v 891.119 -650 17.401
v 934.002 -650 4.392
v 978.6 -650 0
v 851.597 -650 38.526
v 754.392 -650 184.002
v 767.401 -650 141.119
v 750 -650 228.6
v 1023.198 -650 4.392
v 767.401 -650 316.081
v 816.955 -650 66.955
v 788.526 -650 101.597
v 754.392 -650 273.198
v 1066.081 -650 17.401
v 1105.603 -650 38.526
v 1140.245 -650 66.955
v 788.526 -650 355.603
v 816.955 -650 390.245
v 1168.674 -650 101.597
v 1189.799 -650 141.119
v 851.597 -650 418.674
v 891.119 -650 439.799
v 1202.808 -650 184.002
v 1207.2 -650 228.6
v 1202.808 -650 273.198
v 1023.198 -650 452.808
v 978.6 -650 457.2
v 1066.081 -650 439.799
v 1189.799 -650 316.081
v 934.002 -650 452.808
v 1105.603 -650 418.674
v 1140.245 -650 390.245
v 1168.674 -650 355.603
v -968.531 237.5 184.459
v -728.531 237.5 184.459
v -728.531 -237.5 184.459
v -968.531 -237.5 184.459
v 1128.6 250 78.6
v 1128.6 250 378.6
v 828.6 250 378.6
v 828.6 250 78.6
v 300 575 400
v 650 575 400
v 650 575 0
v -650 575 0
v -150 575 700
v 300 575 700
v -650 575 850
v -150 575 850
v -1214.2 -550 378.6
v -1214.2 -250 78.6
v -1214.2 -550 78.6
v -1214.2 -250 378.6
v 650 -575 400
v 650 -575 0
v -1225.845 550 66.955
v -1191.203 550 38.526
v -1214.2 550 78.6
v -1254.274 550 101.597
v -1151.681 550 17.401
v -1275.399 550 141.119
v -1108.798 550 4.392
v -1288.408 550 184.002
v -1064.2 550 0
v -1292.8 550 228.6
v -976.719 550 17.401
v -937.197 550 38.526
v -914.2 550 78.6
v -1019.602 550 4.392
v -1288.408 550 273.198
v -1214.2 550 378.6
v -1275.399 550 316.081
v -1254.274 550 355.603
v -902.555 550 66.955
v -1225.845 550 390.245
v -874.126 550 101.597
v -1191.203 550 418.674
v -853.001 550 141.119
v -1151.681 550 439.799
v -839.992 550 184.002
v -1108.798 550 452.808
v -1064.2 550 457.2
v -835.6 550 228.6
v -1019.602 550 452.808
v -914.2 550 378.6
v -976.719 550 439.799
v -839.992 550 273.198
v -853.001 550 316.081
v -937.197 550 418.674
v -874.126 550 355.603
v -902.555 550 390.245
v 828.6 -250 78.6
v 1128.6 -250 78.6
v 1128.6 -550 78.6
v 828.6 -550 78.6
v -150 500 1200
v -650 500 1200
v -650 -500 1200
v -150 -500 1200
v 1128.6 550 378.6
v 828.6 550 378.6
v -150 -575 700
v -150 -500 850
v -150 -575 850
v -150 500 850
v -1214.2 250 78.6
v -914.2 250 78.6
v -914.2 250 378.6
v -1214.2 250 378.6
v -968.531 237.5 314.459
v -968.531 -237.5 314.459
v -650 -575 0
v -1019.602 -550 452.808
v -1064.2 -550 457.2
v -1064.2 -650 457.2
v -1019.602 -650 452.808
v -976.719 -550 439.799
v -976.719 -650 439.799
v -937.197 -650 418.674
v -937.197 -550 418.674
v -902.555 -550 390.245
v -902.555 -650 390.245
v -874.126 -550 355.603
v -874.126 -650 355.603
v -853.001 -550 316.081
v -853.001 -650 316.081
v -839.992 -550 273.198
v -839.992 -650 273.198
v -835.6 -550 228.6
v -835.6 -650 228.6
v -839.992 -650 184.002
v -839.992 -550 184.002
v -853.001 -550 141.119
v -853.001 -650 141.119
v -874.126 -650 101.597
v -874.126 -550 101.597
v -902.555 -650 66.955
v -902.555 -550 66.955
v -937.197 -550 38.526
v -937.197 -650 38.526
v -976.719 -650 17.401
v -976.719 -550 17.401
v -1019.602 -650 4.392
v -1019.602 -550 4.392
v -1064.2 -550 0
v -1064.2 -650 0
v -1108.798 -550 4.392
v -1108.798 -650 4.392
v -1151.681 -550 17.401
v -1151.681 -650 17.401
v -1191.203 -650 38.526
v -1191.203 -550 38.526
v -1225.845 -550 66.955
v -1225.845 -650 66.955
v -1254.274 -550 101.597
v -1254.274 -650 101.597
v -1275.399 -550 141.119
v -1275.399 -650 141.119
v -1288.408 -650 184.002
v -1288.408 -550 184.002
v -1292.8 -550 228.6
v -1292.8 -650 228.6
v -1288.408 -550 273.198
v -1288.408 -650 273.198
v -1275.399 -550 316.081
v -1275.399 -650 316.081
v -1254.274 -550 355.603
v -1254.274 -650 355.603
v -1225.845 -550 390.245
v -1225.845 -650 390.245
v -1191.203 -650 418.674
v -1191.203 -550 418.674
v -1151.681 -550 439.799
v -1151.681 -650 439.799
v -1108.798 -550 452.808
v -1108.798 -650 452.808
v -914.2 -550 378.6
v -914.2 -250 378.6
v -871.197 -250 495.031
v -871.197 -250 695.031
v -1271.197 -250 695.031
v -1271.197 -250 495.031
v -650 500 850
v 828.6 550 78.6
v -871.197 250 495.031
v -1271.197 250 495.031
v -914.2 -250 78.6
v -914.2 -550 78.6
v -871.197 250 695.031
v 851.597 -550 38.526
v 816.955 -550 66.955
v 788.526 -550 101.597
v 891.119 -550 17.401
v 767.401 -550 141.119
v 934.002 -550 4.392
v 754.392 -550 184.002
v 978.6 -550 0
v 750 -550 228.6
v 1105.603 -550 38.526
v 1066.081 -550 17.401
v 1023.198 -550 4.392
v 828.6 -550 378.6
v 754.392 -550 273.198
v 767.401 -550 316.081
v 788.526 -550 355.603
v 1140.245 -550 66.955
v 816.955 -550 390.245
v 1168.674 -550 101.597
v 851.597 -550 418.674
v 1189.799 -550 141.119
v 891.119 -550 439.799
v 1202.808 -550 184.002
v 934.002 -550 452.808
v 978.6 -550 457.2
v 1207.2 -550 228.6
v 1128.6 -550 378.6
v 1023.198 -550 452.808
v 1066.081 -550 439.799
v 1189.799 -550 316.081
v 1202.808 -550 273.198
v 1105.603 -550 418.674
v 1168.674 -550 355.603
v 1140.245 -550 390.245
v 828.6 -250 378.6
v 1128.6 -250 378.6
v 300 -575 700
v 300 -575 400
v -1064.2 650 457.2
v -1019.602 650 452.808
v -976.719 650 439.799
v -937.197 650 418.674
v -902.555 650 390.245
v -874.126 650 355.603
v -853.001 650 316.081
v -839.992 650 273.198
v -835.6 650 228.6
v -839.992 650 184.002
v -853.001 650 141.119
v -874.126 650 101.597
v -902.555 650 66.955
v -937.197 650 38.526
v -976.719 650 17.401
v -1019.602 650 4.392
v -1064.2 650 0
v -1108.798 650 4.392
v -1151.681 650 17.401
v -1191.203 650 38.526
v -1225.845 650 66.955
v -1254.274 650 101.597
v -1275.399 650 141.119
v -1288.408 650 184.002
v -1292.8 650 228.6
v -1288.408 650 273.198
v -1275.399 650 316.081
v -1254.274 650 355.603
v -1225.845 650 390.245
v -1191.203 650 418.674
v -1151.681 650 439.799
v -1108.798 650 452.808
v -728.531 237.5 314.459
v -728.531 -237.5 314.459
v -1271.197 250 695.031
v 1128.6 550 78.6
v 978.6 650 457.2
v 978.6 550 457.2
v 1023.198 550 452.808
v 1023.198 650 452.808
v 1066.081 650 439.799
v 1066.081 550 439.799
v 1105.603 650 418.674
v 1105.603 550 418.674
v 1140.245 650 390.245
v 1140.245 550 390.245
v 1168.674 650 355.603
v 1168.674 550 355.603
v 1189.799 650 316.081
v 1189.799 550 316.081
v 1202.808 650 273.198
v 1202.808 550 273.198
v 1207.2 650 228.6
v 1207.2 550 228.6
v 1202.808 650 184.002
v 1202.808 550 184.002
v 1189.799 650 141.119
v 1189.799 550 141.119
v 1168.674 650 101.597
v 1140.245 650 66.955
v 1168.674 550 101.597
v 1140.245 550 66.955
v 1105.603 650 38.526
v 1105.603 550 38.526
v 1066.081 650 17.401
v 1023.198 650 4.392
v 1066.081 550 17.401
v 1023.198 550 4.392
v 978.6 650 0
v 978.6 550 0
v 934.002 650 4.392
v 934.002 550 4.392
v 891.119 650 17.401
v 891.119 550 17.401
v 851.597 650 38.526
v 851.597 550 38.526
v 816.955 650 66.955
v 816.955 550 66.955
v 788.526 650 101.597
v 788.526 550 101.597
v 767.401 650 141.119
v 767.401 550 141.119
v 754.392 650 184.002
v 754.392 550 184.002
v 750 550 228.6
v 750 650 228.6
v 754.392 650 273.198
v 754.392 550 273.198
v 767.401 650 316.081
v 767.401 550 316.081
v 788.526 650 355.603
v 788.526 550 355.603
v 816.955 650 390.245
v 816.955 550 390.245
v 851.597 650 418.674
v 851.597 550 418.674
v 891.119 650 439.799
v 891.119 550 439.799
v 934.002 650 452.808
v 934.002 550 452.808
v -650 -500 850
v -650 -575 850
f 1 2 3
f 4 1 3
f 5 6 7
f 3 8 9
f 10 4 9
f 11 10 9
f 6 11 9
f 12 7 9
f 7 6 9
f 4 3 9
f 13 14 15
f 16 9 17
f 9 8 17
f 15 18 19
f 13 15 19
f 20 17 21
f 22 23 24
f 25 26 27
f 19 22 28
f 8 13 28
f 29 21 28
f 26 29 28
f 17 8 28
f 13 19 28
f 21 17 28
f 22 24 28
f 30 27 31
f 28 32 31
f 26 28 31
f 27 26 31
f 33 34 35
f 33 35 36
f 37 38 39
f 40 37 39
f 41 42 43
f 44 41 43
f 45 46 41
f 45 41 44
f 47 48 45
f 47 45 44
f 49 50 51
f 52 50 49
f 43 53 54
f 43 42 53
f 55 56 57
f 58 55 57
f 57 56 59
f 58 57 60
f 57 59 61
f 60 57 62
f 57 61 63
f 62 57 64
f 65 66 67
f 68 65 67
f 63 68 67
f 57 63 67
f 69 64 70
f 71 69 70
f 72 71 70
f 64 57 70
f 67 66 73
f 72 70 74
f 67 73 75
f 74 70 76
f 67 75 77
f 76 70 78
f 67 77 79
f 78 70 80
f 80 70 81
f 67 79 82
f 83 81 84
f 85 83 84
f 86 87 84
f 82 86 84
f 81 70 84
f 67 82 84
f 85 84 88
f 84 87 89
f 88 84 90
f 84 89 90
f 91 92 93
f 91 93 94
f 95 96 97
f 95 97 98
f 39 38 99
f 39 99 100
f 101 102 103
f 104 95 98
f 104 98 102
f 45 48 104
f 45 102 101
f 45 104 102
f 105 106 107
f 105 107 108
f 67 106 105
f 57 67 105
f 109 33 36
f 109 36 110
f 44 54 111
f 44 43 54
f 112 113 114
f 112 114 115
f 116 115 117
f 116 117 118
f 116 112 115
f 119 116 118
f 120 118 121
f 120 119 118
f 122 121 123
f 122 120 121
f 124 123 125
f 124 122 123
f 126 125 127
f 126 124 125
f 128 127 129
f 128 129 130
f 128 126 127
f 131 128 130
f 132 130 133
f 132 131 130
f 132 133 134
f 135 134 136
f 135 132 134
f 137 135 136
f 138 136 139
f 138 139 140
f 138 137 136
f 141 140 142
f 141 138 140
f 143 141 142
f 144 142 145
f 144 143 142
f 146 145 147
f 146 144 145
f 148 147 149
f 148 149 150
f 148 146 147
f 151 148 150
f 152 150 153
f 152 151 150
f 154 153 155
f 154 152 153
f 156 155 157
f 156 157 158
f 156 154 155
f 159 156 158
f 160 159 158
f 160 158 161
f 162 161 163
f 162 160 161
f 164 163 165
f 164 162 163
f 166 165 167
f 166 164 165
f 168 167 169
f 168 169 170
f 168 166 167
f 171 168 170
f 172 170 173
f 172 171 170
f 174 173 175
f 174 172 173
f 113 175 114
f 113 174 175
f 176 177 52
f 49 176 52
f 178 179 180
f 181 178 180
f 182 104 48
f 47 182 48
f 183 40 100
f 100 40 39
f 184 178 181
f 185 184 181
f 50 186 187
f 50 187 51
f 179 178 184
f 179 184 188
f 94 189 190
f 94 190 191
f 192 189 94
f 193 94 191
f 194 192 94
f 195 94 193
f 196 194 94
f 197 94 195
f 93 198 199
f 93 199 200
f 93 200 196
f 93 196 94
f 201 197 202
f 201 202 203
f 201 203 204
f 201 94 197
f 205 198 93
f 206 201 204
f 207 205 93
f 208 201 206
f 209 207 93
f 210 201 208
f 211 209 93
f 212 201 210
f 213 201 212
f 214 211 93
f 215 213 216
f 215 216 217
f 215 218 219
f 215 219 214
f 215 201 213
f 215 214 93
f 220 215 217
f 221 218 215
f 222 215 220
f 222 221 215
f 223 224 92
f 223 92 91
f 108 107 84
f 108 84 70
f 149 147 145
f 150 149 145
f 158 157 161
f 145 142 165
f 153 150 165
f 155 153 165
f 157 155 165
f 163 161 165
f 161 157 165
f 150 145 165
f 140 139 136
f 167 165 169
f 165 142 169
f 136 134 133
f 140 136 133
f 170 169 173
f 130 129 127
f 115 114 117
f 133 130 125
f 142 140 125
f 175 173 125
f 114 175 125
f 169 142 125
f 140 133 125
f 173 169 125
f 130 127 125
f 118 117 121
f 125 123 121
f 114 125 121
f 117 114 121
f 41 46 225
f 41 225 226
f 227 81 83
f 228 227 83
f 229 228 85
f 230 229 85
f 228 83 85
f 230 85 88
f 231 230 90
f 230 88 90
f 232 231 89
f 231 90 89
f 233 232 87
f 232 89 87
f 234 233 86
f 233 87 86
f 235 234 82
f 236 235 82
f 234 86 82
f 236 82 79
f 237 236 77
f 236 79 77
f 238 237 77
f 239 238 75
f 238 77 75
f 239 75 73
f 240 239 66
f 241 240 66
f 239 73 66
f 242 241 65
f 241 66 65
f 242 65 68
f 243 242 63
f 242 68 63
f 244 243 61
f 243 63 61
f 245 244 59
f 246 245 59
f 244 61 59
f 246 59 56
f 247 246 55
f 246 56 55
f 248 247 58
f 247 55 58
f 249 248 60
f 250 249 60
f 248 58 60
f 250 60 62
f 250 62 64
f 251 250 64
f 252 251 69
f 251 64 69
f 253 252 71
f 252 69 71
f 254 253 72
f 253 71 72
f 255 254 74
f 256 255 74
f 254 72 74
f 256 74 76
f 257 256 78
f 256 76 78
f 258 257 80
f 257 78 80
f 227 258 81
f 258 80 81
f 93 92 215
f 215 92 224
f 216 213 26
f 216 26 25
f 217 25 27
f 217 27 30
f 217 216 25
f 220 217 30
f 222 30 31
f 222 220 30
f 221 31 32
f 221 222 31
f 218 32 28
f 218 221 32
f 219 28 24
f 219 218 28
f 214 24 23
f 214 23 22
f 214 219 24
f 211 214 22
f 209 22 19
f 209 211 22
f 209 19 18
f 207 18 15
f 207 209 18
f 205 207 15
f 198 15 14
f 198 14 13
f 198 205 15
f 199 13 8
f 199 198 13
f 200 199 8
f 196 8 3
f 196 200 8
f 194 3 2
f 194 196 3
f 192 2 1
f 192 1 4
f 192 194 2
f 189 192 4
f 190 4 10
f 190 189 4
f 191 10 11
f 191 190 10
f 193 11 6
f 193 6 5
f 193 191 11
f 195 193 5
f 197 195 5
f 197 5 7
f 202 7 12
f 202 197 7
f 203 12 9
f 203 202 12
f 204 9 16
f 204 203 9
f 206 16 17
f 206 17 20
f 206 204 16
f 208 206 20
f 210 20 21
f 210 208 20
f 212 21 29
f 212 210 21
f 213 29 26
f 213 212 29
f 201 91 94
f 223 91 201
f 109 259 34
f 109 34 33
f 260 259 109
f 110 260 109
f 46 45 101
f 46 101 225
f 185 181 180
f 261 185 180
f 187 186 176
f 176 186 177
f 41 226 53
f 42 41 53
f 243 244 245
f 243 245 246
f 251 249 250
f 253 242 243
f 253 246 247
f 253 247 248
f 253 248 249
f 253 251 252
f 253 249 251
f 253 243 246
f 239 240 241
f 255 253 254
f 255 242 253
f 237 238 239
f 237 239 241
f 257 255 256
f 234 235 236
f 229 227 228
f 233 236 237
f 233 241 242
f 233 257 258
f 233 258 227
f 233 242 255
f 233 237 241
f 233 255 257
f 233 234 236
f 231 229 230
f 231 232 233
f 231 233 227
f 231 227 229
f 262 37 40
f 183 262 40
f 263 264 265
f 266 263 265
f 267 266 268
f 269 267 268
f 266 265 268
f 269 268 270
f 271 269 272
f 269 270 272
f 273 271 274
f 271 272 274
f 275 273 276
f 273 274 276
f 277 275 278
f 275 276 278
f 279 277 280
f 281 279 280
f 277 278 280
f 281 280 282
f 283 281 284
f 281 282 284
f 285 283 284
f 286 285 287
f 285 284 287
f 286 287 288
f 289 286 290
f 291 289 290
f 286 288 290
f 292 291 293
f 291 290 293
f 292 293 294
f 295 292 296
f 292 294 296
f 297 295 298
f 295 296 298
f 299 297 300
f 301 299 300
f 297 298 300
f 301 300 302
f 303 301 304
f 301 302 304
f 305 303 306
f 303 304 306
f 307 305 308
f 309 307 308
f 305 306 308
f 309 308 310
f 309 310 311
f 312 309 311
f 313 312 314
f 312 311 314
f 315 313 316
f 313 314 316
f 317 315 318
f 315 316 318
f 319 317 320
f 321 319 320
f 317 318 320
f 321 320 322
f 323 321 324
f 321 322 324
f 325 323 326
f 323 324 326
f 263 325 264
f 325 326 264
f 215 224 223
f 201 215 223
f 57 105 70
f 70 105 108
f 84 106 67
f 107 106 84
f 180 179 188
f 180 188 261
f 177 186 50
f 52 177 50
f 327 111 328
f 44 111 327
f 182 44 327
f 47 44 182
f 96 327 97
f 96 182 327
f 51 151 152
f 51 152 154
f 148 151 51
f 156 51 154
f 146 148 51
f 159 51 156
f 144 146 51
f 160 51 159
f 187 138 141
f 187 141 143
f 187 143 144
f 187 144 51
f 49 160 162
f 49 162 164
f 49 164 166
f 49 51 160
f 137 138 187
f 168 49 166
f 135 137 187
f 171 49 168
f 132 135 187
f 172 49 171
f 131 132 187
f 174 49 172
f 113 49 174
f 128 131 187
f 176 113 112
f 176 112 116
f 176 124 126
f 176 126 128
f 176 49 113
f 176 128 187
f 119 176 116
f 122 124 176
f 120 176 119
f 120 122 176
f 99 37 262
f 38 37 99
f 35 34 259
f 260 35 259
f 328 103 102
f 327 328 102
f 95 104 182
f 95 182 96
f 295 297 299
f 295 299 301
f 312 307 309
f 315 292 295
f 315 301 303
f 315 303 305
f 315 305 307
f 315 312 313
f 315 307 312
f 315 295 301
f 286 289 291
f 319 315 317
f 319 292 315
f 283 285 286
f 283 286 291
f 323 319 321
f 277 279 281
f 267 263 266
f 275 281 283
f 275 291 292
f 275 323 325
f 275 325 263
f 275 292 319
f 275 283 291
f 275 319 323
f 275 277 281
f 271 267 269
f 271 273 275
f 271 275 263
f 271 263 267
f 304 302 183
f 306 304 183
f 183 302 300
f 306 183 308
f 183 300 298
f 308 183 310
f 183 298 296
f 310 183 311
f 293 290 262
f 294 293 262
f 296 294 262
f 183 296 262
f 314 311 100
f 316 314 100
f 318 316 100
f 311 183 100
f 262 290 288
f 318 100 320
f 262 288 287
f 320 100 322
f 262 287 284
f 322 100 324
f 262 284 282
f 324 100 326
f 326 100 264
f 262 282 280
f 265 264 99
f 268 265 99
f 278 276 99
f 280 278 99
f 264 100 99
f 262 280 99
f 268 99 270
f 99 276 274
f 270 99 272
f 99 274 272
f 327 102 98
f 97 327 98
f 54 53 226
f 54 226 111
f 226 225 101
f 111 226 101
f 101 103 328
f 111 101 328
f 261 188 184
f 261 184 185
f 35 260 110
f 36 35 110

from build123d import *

# Parameters (mm, degrees)
BOSS_EXTRUDE1_START = 550
SKETCH1_R           = 228.6
BOSS_EXTRUDE1_DEPTH = 100
BOSS_EXTRUDE2_START = 237.5
SKETCH1_3_W         = 240
SKETCH1_3_H         = 130
BOSS_EXTRUDE2_DEPTH = 475
BOSS_EXTRUDE3_START = 250
SKETCH1_4_W         = 300
SKETCH1_4_H         = 300
BOSS_EXTRUDE3_DEPTH = 300
BOSS_EXTRUDE4_DEPTH = 575
SKETCH3_W           = 150
SKETCH3_H           = 350
CUT_EXTRUDE1_DEPTH  = 2150
BOSS_EXTRUDE5_START = 250
SKETCH1_6_W         = 300
SKETCH1_6_H         = 300
BOSS_EXTRUDE5_DEPTH = 300
BOSS_EXTRUDE6_START = 550
SKETCH1_7_R         = 228.6
BOSS_EXTRUDE6_DEPTH = 100
BOSS_EXTRUDE7_START = -250
SKETCH1_8_W         = 400
SKETCH1_8_H         = 200
BOSS_EXTRUDE7_DEPTH = 500


with BuildPart() as part:
    # Sketch1 → Boss-Extrude1 (new body)
    with BuildSketch(Plane(origin=(0, 0, 0), x_dir=(-1, 0, 0), z_dir=(0, 1, 0)).offset(BOSS_EXTRUDE1_START)):
        with Locations(Location((-978.6, 228.6, 0), (0, 0, 90))):
            Circle(SKETCH1_R)
    extrude(amount=BOSS_EXTRUDE1_DEPTH)

    # Sketch1<4> → Boss-Extrude3 (add)
    with BuildSketch(Plane(origin=(0, 0, 0), x_dir=(-1, 0, 0), z_dir=(0, 1, 0)).offset(BOSS_EXTRUDE3_START)):
        with Locations((-978.6, 228.6)):
            Rectangle(SKETCH1_4_W, SKETCH1_4_H)
    extrude(amount=BOSS_EXTRUDE3_DEPTH)


with BuildPart() as body_2:
    # Sketch1<3> → Boss-Extrude2 (new body)
    with BuildSketch(Plane(origin=(0, 0, 0), x_dir=(-1, 0, 0), z_dir=(0, 1, 0)).offset(BOSS_EXTRUDE2_START)):
        with Locations((848.531198444, 249.459130285)):
            Rectangle(SKETCH1_3_W, SKETCH1_3_H)
    extrude(amount=-BOSS_EXTRUDE2_DEPTH)


with BuildPart() as body_3:
    # Sketch1<5> → Boss-Extrude4 (new, symmetric)
    with BuildSketch(Plane(origin=(0, 0, 0), x_dir=(-1, 0, 0), z_dir=(0, 1, 0))):
        Polygon((650, 0), (650, 1200), (150, 1200), (150, 700), (-300, 700), (-300, 400), (-650, 400), (-650, 0), align=None)
    extrude(amount=BOSS_EXTRUDE4_DEPTH, both=True)

    # Sketch3 → Cut-Extrude1 (cut)
    with BuildSketch(Plane.YZ.offset(1500)):
        with Locations((-575, 1025)):
            Rectangle(SKETCH3_W, SKETCH3_H)
        with Locations((575, 1025)):
            Rectangle(SKETCH3_W, SKETCH3_H)
    extrude(amount=-CUT_EXTRUDE1_DEPTH, mode=Mode.SUBTRACT)


with BuildPart() as body_4:
    # Sketch1<6> → Boss-Extrude5 (new body)
    with BuildSketch(Plane(origin=(0, 0, 0), x_dir=(-1, 0, 0), z_dir=(0, 1, 0)).offset(BOSS_EXTRUDE5_START)):
        with Locations((1064.2, 228.6)):
            Rectangle(SKETCH1_6_W, SKETCH1_6_H)
    extrude(amount=BOSS_EXTRUDE5_DEPTH)

    # Sketch1<7> → Boss-Extrude6 (add)
    with BuildSketch(Plane(origin=(0, 0, 0), x_dir=(-1, 0, 0), z_dir=(0, 1, 0)).offset(BOSS_EXTRUDE6_START)):
        with Locations(Location((1064.2, 228.6, 0), (0, 0, 90))):
            Circle(SKETCH1_7_R)
    extrude(amount=BOSS_EXTRUDE6_DEPTH)


with BuildPart() as body_5:
    # Sketch1<8> → Boss-Extrude7 (new body)
    with BuildSketch(Plane(origin=(0, 0, 0), x_dir=(-1, 0, 0), z_dir=(0, 1, 0)).offset(BOSS_EXTRUDE7_START)):
        with Locations((1071.196951814, 595.030649521)):
            Rectangle(SKETCH1_8_W, SKETCH1_8_H)
    extrude(amount=BOSS_EXTRUDE7_DEPTH)


with BuildPart() as body_6:
    # Mirror1: mirrored copy
    add(part.part.mirror(Plane.ZX))


with BuildPart() as body_7:
    # Mirror1 2: mirrored copy
    add(body_4.part.mirror(Plane.ZX))


solid = Compound([part.part, body_2.part, body_3.part, body_4.part, body_5.part, body_6.part, body_7.part])
